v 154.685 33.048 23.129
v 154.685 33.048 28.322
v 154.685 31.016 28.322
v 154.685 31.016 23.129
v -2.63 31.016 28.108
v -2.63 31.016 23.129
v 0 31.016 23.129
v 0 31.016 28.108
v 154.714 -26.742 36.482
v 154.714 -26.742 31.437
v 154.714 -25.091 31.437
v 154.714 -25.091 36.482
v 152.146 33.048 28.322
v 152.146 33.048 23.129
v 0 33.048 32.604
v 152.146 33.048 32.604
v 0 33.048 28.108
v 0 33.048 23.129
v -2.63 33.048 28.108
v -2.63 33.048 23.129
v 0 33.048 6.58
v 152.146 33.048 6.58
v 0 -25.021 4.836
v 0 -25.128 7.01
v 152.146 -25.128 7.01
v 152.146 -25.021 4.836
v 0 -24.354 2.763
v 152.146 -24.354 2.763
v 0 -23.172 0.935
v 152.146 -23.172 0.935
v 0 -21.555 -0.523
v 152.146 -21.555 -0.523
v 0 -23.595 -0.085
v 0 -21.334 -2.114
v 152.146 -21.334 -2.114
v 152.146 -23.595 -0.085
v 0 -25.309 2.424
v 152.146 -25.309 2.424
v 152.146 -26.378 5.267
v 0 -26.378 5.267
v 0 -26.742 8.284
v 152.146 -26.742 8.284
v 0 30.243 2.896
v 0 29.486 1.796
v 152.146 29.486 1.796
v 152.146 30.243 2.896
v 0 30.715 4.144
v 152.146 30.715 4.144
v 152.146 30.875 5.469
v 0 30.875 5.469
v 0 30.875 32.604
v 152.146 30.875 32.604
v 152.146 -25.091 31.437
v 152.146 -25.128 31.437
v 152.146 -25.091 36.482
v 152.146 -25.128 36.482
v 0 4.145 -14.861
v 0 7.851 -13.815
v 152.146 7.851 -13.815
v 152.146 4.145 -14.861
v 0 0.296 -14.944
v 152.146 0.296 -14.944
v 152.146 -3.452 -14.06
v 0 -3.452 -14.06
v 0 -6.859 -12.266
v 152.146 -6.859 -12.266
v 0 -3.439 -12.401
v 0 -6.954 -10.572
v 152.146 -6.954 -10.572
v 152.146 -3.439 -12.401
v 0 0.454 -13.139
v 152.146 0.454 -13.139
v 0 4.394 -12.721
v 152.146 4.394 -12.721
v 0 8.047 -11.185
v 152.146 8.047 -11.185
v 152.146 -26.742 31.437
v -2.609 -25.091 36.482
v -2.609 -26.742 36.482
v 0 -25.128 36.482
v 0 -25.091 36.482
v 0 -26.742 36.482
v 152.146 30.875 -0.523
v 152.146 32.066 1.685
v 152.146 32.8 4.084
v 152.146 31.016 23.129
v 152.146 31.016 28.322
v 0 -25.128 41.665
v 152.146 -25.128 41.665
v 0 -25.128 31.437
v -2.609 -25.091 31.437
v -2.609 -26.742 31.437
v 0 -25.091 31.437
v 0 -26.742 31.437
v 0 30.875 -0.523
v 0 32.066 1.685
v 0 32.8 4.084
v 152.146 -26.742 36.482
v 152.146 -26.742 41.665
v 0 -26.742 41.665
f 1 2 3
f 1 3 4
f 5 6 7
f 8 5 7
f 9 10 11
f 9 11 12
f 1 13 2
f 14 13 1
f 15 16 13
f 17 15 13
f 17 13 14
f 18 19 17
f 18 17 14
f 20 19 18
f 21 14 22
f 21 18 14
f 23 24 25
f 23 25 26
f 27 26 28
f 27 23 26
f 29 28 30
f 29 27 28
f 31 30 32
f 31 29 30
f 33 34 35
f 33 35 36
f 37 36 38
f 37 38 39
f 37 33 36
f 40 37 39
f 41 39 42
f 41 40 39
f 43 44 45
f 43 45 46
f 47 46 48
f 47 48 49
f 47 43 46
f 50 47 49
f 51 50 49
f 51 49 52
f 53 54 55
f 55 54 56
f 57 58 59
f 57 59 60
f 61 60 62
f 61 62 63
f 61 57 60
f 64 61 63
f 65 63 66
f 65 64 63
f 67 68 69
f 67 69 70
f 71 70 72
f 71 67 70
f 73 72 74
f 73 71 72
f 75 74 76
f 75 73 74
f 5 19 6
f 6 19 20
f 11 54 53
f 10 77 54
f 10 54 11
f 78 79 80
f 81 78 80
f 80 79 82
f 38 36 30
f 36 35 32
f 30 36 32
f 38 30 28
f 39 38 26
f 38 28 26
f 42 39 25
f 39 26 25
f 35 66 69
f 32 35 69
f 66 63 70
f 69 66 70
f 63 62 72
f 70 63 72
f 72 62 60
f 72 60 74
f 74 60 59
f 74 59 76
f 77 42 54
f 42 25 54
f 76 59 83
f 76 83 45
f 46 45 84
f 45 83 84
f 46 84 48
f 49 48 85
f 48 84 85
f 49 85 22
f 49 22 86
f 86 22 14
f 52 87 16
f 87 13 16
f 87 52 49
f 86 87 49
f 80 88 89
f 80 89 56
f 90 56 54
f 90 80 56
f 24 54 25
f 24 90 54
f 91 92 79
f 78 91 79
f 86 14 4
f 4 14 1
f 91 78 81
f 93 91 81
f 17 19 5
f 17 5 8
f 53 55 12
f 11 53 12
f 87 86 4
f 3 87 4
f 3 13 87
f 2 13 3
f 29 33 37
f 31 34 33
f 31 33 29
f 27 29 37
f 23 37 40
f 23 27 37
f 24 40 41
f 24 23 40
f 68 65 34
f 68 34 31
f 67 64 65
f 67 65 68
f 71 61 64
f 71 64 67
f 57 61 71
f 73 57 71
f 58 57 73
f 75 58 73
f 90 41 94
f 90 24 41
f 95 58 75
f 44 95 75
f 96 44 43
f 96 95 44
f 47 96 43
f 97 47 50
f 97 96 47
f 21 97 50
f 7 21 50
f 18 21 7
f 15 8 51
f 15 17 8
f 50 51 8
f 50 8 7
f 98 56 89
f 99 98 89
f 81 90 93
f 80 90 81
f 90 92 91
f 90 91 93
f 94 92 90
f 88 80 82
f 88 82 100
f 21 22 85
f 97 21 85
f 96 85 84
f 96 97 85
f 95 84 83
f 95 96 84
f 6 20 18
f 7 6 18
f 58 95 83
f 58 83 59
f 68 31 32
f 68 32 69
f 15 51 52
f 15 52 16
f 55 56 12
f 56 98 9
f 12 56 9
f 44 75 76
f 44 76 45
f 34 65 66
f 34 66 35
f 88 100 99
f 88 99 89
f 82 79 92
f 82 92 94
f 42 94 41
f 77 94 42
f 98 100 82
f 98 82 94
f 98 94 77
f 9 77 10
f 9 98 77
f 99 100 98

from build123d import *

# Parameters (mm, degrees)
BOSS_EXTRUDE1_DEPTH = 152.146
SKETCH2_W           = 2.629781943
SKETCH2_H           = 4.979405242
SKETCH2_W_2         = 2.539494313
SKETCH2_H_2         = 5.192930254
BOSS_EXTRUDE3_DEPTH = 2.032
SKETCH3_W           = 2.60862661
SKETCH3_H           = 5.045368892
SKETCH3_W_2         = 2.568412546
BOSS_EXTRUDE4_DEPTH = 1.651


with BuildPart() as part:
    # Sketch1 → Boss-Extrude1 (new body)
    with BuildSketch(Plane(origin=(0, 0, 0), x_dir=(0, 0, -1), z_dir=(1, 0, 0))):
        with BuildLine():
            Line((-32.603582083, 33.04768703), (-6.580220299, 33.04768703))
            ThreePointArc((-6.580220299, 33.04768703), (-2.866044415, 32.492434763), (0.523359095, 30.875229944))
            Line((0.523359095, 30.875229944), (13.81460794, 7.851288488))
            ThreePointArc((13.81460794, 7.851288488), (14.944302174, 0.295801394), (12.265554132, -6.858631022))
            Line((12.265554132, -6.858631022), (2.114134999, -21.333695036))
            ThreePointArc((2.114134999, -21.333695036), (-2.423671509, -25.308819533), (-8.283736886, -26.741626725))
            Line((-8.283736886, -26.741626725), (-41.665173314, -26.741626725))
            Line((-41.665173314, -26.741626725), (-41.665173314, -25.127558449))
            Line((-41.665173314, -25.127558449), (-7.009997937, -25.127558449))
            ThreePointArc((-7.009997937, -25.127558449), (-2.763170648, -24.353946154), (0.523359095, -21.555242836))
            Line((0.523359095, -21.555242836), (10.572249768, -6.954220772))
            ThreePointArc((10.572249768, -6.954220772), (13.138578862, 0.45392413), (11.185206305, 8.046749136))
            Line((11.185206305, 8.046749136), (-1.796106944, 29.486000218))
            ThreePointArc((-1.796106944, 29.486000218), (-3.505733028, 30.516318699), (-5.469291084, 30.875229944))
            Line((-5.469291084, 30.875229944), (-32.603582083, 30.875229944))
            Line((-32.603582083, 30.875229944), (-32.603582083, 33.04768703))
        make_face()
    extrude(amount=BOSS_EXTRUDE1_DEPTH)

    # Sketch2 → Boss-Extrude3 (add)
    with BuildSketch(Plane(origin=(0, 33.04768703, 0), x_dir=(1, 0, 0), z_dir=(0, 1, 0))):
        with Locations((-1.314890972, -25.618719559)):
            Rectangle(SKETCH2_W, SKETCH2_H)
        with Locations((153.415747157, -25.725482065)):
            Rectangle(SKETCH2_W_2, SKETCH2_H_2)
    extrude(amount=-BOSS_EXTRUDE3_DEPTH)

    # Sketch3 → Boss-Extrude4 (add)
    with BuildSketch(Plane.XZ.offset(26.741626725)):
        with Locations((-1.304313305, 33.959702232)):
            Rectangle(SKETCH3_W, SKETCH3_H)
        with Locations((153.430206273, 33.959702232)):
            Rectangle(SKETCH3_W_2, SKETCH3_H)
    extrude(amount=-BOSS_EXTRUDE4_DEPTH)


solid = part.part
